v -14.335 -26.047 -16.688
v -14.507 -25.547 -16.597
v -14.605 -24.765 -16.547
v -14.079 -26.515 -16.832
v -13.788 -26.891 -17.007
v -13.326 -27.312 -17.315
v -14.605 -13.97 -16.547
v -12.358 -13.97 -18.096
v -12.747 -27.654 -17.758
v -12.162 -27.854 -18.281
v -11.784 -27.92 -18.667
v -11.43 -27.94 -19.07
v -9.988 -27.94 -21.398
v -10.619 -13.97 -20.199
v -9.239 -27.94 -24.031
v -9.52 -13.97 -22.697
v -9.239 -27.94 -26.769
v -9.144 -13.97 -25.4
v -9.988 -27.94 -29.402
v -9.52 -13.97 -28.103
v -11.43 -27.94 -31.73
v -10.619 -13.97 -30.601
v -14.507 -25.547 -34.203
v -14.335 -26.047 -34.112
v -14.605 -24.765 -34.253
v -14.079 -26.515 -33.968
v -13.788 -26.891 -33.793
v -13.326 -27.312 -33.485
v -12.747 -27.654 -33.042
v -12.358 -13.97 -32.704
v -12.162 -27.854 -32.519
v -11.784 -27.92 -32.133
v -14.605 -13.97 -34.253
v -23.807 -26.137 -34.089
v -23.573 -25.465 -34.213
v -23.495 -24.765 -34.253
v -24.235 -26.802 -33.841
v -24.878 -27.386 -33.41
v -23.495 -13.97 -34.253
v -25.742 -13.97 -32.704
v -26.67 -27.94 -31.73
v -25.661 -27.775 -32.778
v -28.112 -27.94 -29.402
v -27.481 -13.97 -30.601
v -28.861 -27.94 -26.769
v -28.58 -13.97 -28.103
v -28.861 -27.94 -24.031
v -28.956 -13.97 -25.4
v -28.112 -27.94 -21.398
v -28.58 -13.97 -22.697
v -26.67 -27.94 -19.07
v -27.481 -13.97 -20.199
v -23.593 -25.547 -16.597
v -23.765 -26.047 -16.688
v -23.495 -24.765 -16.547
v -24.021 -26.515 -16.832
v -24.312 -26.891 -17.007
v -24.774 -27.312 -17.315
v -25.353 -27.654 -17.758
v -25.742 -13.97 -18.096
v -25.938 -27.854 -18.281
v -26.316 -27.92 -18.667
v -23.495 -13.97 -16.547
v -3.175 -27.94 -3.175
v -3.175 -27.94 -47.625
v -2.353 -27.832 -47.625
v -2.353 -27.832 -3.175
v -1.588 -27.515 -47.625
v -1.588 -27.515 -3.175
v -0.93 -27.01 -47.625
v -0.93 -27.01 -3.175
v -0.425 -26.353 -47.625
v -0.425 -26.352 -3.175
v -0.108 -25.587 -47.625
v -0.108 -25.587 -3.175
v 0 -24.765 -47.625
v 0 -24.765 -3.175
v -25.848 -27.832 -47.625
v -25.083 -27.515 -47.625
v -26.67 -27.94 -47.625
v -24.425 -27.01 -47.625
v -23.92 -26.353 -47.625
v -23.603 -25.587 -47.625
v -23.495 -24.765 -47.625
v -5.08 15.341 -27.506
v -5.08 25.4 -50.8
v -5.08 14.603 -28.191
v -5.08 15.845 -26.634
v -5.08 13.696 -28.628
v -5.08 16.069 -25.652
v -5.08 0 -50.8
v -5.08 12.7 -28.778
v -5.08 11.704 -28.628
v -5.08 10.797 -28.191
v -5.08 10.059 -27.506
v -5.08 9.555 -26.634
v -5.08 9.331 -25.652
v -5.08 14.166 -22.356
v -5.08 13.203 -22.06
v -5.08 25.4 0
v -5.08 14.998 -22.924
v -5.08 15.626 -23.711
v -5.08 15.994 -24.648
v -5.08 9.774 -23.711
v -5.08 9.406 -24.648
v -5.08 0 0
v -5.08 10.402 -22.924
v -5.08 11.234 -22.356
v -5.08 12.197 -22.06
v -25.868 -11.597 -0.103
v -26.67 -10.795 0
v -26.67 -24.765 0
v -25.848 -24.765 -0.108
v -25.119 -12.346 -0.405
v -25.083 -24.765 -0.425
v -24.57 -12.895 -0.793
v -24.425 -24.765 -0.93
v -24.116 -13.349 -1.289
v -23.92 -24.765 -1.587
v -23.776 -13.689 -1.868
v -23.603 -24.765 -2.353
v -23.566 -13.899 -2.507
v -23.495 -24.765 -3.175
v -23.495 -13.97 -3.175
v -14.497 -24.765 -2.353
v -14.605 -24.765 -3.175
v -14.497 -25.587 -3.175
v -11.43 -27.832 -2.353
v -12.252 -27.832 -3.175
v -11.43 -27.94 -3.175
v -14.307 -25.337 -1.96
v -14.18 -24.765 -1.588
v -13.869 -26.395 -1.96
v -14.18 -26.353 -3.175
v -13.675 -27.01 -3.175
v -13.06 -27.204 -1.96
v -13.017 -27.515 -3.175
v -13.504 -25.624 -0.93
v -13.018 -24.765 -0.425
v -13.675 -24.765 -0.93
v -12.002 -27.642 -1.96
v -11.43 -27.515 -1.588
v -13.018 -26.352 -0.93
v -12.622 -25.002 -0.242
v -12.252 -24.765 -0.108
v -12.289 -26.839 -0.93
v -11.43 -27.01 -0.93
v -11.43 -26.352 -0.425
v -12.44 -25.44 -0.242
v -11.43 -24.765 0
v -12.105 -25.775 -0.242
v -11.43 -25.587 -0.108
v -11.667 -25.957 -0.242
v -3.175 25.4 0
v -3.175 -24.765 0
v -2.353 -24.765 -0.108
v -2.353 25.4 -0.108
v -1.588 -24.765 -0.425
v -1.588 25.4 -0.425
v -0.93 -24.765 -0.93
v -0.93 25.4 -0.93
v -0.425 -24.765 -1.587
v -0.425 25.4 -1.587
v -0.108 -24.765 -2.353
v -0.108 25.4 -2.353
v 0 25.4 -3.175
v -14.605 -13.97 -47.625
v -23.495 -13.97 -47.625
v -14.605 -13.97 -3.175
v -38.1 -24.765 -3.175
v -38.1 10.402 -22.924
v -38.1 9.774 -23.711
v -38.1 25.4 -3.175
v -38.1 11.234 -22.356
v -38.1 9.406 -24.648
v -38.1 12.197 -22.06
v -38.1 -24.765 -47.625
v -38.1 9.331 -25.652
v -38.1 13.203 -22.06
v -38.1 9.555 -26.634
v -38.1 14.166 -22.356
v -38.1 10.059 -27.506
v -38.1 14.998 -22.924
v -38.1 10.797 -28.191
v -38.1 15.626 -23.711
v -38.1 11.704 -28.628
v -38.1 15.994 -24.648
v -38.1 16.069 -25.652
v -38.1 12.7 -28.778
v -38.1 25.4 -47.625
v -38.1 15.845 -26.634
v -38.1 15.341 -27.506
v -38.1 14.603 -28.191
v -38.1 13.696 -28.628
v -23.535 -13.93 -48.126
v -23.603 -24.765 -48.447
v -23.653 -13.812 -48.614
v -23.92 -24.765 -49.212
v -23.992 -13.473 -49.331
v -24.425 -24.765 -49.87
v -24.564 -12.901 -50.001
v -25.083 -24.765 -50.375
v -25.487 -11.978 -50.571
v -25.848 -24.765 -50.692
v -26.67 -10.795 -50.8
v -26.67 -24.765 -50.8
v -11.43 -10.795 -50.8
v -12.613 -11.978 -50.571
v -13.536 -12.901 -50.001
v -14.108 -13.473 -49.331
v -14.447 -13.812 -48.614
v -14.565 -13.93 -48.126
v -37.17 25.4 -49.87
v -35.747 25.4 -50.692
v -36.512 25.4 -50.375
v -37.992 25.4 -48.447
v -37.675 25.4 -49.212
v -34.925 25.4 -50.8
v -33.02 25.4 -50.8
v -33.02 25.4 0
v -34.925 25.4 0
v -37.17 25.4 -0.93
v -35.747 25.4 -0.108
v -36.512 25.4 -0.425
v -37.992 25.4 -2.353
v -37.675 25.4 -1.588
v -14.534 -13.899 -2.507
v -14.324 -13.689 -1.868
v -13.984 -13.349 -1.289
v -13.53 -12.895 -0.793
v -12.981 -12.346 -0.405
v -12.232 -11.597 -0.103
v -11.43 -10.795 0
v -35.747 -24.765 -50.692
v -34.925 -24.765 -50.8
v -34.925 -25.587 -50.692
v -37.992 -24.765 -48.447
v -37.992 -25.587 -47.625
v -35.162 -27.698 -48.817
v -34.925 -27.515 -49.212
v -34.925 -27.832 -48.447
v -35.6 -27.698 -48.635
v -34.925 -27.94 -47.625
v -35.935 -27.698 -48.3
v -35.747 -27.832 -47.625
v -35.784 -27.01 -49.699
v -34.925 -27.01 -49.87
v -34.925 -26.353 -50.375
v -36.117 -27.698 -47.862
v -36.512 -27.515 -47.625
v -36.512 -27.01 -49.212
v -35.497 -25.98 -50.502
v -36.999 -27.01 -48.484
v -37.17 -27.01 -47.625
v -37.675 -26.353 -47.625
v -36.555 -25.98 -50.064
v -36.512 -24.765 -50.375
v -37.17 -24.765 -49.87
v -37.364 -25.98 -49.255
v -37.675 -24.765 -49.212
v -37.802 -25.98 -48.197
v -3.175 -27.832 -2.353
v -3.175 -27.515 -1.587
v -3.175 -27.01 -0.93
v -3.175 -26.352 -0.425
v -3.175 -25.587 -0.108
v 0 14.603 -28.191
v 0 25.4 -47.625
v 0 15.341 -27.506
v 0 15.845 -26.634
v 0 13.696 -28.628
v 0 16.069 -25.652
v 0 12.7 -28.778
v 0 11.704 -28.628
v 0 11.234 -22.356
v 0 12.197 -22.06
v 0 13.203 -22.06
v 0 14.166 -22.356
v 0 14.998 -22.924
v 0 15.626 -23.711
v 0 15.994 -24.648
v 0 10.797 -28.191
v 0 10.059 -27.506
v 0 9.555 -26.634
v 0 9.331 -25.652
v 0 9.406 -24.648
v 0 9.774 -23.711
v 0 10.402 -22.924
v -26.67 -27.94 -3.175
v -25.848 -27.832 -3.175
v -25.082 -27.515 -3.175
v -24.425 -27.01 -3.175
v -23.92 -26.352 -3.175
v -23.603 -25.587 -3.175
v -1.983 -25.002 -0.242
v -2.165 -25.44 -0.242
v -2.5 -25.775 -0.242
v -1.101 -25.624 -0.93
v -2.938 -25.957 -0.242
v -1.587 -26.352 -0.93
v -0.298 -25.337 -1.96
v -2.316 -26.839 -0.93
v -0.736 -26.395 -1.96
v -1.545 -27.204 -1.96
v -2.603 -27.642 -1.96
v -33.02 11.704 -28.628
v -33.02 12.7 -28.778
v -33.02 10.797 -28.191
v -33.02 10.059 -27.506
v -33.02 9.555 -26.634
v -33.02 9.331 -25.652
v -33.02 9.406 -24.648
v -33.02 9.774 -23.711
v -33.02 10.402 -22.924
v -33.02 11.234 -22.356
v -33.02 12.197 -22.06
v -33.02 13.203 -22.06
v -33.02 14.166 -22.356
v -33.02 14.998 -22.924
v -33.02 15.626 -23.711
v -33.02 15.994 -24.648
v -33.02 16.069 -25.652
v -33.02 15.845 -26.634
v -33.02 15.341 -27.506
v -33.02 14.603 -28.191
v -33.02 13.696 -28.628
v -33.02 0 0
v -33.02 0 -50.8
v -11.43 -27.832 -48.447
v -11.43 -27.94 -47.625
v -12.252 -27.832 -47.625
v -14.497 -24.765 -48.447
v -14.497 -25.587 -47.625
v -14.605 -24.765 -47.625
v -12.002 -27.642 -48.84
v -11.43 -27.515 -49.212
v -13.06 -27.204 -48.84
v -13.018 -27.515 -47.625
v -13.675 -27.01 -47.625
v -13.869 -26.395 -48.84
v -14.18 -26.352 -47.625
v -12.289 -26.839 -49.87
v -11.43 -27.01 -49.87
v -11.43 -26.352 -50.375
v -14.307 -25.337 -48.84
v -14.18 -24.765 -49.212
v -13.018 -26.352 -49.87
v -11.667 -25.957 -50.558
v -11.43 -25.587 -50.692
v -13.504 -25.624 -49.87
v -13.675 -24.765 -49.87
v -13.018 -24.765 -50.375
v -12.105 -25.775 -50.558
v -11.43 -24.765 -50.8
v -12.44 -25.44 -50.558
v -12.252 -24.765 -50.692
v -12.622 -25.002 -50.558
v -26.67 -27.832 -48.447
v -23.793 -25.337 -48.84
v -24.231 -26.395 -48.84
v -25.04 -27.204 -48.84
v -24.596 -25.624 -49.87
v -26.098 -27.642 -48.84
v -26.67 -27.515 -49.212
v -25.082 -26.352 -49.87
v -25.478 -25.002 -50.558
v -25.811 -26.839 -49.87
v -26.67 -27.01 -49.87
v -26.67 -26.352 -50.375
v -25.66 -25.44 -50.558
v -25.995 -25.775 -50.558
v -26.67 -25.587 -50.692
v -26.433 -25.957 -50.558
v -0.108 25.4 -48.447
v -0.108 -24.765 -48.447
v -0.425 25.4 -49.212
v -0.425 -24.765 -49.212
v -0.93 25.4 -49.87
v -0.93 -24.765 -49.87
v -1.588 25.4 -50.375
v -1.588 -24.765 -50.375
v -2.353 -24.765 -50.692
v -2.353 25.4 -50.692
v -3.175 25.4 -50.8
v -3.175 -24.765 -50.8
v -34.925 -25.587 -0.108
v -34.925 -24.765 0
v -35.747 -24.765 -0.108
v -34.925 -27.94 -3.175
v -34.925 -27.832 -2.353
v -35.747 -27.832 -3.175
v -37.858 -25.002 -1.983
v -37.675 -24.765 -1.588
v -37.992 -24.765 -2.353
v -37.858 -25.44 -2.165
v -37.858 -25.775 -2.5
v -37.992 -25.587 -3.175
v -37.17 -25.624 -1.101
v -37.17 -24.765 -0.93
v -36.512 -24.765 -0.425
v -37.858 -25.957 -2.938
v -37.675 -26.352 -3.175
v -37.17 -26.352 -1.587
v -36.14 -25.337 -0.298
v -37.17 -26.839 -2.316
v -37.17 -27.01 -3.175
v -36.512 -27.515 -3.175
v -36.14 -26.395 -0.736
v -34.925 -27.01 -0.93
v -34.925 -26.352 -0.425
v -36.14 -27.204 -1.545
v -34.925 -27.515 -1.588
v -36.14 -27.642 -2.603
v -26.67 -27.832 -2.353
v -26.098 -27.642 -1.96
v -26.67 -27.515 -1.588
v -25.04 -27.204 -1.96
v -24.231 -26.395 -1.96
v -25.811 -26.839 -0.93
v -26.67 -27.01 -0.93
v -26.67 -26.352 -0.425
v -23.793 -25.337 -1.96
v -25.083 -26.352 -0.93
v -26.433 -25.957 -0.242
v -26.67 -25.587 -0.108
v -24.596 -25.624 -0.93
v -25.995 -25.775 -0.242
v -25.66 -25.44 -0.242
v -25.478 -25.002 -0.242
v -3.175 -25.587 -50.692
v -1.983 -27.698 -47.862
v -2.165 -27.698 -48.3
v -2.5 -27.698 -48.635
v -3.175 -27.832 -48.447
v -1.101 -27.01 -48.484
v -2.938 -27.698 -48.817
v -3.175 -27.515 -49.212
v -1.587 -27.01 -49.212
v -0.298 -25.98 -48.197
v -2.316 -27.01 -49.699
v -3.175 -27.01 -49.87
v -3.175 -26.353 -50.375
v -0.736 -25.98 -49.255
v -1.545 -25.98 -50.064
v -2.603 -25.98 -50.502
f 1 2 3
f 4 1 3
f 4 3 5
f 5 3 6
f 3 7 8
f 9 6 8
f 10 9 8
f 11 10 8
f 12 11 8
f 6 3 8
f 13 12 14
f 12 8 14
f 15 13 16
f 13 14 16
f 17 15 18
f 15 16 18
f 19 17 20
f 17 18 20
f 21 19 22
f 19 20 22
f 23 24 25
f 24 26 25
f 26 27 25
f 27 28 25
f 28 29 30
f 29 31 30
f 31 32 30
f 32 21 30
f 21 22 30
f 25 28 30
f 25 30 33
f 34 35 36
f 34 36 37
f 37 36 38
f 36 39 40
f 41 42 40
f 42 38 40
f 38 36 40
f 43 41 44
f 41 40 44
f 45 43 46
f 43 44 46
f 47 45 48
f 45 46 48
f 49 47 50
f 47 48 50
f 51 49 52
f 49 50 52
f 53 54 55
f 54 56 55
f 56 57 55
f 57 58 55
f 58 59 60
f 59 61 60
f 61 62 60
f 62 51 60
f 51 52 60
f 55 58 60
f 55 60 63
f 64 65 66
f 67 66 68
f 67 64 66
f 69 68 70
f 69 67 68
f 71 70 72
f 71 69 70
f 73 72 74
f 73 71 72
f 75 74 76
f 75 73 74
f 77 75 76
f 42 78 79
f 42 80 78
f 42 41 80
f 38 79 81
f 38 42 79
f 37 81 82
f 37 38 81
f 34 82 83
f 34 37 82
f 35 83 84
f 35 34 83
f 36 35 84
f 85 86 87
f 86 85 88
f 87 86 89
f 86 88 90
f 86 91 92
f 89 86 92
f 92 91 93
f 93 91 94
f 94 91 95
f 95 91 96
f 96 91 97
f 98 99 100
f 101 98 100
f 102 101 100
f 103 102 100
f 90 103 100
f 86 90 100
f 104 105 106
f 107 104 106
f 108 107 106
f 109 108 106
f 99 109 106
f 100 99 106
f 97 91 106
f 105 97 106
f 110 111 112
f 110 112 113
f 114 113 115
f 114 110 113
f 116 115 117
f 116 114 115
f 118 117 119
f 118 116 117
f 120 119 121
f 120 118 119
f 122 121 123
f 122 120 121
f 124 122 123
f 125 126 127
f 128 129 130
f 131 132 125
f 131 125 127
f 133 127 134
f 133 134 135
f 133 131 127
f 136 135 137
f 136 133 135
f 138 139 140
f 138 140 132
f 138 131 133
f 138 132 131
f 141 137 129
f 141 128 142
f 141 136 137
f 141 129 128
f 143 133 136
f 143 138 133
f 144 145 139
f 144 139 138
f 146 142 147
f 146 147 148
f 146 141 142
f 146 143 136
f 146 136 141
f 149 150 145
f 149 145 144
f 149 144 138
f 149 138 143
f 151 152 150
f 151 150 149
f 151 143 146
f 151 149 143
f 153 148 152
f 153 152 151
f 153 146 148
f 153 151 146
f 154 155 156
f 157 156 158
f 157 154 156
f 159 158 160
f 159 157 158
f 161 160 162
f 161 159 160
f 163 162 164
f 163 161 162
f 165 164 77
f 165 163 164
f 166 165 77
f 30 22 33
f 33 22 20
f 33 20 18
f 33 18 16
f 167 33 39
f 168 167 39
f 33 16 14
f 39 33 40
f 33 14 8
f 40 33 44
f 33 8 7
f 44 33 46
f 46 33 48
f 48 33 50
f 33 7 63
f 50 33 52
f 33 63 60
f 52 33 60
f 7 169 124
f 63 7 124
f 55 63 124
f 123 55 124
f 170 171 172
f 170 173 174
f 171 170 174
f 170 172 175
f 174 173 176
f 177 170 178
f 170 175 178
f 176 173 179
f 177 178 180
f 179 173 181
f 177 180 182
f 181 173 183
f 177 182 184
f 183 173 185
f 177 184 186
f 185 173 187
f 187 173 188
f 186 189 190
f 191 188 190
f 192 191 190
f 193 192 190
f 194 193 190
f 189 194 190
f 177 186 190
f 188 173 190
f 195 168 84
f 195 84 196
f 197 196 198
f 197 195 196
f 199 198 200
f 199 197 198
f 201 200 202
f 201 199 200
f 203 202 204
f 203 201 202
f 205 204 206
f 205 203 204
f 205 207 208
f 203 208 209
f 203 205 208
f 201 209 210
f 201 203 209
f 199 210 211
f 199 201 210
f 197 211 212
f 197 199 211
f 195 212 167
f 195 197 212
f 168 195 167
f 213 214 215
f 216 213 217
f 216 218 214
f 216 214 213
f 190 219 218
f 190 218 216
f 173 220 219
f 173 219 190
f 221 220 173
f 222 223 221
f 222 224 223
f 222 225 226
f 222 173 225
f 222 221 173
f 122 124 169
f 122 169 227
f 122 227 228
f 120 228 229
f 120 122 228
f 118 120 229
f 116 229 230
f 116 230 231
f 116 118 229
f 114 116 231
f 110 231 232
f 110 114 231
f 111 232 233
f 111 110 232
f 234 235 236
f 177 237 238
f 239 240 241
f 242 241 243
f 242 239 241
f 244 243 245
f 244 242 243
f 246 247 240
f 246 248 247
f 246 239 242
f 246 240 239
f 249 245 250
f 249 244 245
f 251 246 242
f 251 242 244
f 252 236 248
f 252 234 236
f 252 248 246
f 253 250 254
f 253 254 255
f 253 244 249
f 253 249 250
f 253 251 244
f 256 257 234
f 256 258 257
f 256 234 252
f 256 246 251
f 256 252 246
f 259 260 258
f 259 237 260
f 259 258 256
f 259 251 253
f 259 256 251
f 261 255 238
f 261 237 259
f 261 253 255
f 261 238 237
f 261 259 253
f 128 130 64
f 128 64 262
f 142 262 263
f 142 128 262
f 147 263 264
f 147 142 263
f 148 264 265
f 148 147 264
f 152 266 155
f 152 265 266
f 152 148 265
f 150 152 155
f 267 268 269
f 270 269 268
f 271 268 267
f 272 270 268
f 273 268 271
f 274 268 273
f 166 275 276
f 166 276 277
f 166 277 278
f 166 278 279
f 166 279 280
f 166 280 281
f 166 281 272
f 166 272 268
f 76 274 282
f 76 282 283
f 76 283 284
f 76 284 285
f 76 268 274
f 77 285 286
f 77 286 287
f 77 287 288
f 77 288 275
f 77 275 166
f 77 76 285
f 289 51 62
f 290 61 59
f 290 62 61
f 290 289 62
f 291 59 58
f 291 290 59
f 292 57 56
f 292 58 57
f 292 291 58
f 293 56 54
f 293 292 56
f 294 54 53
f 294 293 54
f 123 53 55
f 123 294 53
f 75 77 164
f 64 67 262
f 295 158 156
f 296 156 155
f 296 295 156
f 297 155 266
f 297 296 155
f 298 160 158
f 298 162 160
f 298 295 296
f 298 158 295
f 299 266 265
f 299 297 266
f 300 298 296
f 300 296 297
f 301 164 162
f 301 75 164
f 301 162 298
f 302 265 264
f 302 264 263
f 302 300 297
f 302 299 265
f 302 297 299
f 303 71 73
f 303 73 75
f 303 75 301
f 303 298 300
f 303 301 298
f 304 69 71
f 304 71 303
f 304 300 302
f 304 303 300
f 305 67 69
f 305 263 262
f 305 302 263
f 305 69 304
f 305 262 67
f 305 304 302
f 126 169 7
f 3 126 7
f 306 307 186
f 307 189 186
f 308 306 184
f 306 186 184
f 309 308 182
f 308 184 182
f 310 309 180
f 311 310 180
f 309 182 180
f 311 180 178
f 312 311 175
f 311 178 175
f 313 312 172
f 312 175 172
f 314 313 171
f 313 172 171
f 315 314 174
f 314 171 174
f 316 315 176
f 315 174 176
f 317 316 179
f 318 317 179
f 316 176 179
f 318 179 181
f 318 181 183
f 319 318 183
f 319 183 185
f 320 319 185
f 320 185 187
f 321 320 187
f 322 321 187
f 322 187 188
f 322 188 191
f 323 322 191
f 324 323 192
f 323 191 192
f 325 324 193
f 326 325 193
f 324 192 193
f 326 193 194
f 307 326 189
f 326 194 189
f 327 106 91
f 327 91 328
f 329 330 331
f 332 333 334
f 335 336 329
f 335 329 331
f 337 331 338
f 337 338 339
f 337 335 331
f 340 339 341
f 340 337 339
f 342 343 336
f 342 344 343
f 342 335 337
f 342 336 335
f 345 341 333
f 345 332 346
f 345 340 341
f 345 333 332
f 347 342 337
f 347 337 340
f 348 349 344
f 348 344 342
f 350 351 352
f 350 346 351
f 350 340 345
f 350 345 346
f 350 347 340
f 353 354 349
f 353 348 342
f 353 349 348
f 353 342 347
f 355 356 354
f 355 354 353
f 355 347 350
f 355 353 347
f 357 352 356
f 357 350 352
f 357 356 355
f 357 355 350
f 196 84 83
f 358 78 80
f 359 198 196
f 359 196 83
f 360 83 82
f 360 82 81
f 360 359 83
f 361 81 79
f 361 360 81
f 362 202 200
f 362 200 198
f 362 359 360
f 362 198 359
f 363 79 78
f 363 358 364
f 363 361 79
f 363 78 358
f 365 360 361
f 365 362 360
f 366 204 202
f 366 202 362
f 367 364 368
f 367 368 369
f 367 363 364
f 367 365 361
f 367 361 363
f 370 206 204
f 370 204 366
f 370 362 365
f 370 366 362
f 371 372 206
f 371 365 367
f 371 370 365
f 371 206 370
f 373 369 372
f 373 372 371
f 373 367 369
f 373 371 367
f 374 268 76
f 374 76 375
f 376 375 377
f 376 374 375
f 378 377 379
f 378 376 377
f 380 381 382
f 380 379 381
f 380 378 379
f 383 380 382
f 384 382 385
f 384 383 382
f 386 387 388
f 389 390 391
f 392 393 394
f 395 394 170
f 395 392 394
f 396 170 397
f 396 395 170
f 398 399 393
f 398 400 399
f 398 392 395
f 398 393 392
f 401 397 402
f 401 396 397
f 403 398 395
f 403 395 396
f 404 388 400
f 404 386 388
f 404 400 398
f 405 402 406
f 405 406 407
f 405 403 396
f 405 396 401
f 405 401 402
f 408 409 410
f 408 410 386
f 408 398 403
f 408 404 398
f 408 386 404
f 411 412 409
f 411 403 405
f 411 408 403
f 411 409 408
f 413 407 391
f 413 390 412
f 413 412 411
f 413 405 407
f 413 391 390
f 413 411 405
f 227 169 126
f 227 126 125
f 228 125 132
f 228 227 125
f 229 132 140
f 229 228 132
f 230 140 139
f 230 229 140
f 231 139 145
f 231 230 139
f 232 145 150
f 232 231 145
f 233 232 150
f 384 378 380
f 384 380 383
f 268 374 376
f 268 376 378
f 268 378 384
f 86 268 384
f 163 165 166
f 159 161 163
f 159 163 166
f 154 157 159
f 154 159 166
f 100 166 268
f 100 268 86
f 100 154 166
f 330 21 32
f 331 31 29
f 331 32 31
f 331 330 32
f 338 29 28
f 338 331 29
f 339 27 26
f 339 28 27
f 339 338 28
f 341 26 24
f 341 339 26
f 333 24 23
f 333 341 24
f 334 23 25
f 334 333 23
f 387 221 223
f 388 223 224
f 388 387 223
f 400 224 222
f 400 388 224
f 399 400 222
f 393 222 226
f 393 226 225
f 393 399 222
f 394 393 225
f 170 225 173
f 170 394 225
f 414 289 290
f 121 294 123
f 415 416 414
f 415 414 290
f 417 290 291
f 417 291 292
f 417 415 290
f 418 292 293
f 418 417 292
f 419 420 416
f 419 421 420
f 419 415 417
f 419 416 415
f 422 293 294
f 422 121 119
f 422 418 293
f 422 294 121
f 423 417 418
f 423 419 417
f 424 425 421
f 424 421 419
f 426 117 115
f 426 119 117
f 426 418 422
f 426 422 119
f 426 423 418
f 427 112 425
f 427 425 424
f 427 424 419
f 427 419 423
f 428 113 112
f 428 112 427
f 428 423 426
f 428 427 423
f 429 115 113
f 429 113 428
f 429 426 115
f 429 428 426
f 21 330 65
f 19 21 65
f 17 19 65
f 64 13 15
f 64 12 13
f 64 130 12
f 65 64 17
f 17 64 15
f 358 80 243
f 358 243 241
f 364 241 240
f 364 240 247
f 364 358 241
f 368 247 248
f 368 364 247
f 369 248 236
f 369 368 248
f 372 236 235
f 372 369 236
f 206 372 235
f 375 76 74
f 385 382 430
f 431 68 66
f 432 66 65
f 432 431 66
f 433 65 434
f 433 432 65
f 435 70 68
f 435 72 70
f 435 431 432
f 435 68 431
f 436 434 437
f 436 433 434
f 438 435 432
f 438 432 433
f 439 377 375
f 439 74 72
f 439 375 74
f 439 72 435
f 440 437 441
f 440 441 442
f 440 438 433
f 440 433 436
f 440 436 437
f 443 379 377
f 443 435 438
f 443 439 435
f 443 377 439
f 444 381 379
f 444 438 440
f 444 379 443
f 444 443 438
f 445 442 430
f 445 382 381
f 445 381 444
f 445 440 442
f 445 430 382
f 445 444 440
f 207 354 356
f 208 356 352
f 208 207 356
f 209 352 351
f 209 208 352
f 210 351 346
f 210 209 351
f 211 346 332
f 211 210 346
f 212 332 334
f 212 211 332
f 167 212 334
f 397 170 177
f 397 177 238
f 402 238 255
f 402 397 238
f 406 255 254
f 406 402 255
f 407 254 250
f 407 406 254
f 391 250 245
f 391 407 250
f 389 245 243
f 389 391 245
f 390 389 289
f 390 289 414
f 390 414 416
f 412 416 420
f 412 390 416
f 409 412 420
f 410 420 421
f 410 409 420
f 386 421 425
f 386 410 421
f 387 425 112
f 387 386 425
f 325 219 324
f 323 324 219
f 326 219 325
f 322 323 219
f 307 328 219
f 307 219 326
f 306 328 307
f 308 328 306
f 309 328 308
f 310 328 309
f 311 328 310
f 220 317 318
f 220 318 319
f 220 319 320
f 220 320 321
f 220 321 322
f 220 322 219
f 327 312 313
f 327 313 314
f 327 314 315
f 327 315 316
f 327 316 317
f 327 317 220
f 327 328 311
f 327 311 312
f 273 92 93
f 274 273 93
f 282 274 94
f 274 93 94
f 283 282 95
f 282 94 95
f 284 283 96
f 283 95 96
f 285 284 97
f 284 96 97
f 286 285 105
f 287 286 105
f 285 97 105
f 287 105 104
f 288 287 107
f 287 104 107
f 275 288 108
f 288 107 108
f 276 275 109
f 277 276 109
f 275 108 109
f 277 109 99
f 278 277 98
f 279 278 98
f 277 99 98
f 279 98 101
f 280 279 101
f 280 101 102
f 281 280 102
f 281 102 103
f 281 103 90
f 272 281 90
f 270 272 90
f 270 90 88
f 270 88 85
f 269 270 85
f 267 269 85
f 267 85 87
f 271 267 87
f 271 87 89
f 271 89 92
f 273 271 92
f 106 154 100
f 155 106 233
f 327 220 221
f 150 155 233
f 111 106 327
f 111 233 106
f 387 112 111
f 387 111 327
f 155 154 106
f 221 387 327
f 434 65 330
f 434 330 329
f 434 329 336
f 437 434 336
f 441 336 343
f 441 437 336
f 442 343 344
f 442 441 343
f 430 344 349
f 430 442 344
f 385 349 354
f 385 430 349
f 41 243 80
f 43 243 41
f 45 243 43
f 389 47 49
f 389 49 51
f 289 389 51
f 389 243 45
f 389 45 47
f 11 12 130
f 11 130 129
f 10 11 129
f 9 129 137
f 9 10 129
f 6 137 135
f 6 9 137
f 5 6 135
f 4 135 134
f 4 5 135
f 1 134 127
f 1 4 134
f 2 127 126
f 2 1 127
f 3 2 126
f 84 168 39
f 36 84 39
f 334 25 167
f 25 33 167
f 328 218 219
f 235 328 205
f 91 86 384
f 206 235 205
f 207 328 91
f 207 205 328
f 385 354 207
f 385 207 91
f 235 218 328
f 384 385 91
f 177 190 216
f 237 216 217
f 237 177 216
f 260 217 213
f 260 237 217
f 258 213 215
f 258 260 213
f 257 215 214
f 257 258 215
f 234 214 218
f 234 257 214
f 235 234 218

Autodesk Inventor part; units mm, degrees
ref_plane "YZ Plane" through (0, 0, 0) normal (1, 0, 0) x (0, 1, 0)
ref_plane "XZ Plane" through (0, 0, 0) normal (0, 1, 0) x (-1, 0, 0)
ref_plane "XY Plane" through (0, 0, 0) normal (0, 0, 1) x (1, 0, 0)
sketch "Sketch1" plane through (0, 0, 0) normal (0, 1, 0) x (-1, 0, 0)
  line L0 (0, 0) -> (38.1, 0)
  line L1 (38.1, 0) -> (38.1, -50.8)
  line L2 (38.1, -50.8) -> (0, -50.8)
  line L3 (0, -50.8) -> (0, 0)
  line L4 (38.1, -50.8) -> (33.02, -50.8)
  line L5 (33.02, -50.8) -> (33.02, 0)
  line L6 (33.02, 0) -> (38.1, 0)
  line L7 (38.1, 0) -> (38.1, -50.8)
  line L8 (0, -50.8) -> (5.08, -50.8)
  line L9 (5.08, -50.8) -> (5.08, 0)
  line L10 (5.08, 0) -> (0, 0)
  line L11 (0, 0) -> (0, -50.8)
  dimension "d0" = 38.1
  dimension "d1" = 50.8
  dimension "d2" = 5.08
  dimension "d3" = 5.08
extrude "Extrusion1" add sketch "Sketch1" along normal blind 25.4 contours L0 L9 L2 L3 | L0 L1 L2 L5
extrude "Extrusion2" add sketch "Sketch1" against normal blind 13.97
sketch "Sketch2" plane through (0, 25.4, 0) normal (1, 0, 0) x (0, 0, -1)
  line L0 (50.8, 0) -> (0, 0) projected
  line L1 (25.4, 0) -> (25.4, -12.7)
  point P0 (0, -25.4)
  dimension "d8" = 12.7
hole "Hole1" at (0, 12.7, -25.4) direction (-1, 0, 0) diameter 6.7564 end through all clearance for "Socket Head Cap Screw" size "1/4" standard "Ansi Unified Screw Threads"
sketch "Sketch3" plane through (0, -13.97, 0) normal (0, -1, 0) x (1, 0, 0)
  line L0 (-38.1, -28.7782) -> (-38.1, -22.0218) projected
  line L1 (-38.1, -25.4) -> (-19.05, -25.4)
  line L2 (0, 0) -> (-38.1, 0) projected
  line L3 (-14.605, -50.8) -> (-23.495, -50.8)
  line L4 (-23.495, -50.8) -> (-23.495, 0)
  line L5 (-23.495, 0) -> (-14.605, 0)
  line L6 (-14.605, 0) -> (-14.605, -50.8)
  line L7 (-14.605, -50.8) -> (-23.495, 0) construction
  line L8 (-23.495, -50.8) -> (-14.605, 0) construction
  circle A0 centre (-19.05, -25.4) radius 9.906
  line L9 (-38.1, -50.8) -> (0, -50.8)
  line L10 (0, -50.8) -> (0, 0)
  line L11 (0, 0) -> (-38.1, 0)
  line L12 (-38.1, 0) -> (-38.1, -50.8)
  line L13 (-38.1, -50.8) -> (0, 0) construction
  line L14 (0, -50.8) -> (-38.1, 0) construction
  point P0 (-14.605, -16.5473)
  point P1 (-14.605, -34.2527)
  point P2 (-23.495, -34.2527)
  point P3 (-23.495, -16.5473)
  dimension "d16" = 19.05
  dimension "d17" = 8.89
  dimension "d18" = 19.812
extrude "Extrusion3" add sketch "Sketch3" along normal blind 13.97 contours L0 L1 A0 L4 L9 L12 | L0 L12 L2 L4 A0 L1 | L6 A0 L2 L10 L9
fillet "Fillet1" radius 3.175 14 edges at (-38.1, -1.27, -50.8) (0, -1.27, -50.8) (-7.3025, -27.94, -50.8) (0, -27.94, -25.4) (-30.7975, -27.94, -50.8) (-7.3025, -27.94, 0) (-30.7975, -27.94, 0) (-38.1, -27.94, -25.4) (-38.1, -1.27, 0) (0, -1.27, 0) (-14.605, -27.94, -42.5264) (-14.605, -27.94, -8.2736) (-23.495, -27.94, -8.2736) (-23.495, -27.94, -42.5264)
fillet "Fillet2" radius 3.175 14 edges at (-19.05, -13.97, 0) (-19.05, -13.97, -50.8) (-24.4249, -27.0101, -0.9299) (-23.495, -19.3675, 0) (-13.6751, -27.0101, -0.9299) (-14.605, -19.3675, 0) (-13.6751, -27.0101, -49.8701) (-7.3025, -27.94, -47.625) (-3.175, -27.0101, -49.8701) (-14.605, -19.3675, -50.8) (-34.925, -27.0101, -49.8701) (-30.7975, -27.94, -47.625) (-24.4249, -27.0101, -49.8701) (-23.495, -19.3675, -50.8)
properties part number "Sample Holder end for 8020-valveholder"
